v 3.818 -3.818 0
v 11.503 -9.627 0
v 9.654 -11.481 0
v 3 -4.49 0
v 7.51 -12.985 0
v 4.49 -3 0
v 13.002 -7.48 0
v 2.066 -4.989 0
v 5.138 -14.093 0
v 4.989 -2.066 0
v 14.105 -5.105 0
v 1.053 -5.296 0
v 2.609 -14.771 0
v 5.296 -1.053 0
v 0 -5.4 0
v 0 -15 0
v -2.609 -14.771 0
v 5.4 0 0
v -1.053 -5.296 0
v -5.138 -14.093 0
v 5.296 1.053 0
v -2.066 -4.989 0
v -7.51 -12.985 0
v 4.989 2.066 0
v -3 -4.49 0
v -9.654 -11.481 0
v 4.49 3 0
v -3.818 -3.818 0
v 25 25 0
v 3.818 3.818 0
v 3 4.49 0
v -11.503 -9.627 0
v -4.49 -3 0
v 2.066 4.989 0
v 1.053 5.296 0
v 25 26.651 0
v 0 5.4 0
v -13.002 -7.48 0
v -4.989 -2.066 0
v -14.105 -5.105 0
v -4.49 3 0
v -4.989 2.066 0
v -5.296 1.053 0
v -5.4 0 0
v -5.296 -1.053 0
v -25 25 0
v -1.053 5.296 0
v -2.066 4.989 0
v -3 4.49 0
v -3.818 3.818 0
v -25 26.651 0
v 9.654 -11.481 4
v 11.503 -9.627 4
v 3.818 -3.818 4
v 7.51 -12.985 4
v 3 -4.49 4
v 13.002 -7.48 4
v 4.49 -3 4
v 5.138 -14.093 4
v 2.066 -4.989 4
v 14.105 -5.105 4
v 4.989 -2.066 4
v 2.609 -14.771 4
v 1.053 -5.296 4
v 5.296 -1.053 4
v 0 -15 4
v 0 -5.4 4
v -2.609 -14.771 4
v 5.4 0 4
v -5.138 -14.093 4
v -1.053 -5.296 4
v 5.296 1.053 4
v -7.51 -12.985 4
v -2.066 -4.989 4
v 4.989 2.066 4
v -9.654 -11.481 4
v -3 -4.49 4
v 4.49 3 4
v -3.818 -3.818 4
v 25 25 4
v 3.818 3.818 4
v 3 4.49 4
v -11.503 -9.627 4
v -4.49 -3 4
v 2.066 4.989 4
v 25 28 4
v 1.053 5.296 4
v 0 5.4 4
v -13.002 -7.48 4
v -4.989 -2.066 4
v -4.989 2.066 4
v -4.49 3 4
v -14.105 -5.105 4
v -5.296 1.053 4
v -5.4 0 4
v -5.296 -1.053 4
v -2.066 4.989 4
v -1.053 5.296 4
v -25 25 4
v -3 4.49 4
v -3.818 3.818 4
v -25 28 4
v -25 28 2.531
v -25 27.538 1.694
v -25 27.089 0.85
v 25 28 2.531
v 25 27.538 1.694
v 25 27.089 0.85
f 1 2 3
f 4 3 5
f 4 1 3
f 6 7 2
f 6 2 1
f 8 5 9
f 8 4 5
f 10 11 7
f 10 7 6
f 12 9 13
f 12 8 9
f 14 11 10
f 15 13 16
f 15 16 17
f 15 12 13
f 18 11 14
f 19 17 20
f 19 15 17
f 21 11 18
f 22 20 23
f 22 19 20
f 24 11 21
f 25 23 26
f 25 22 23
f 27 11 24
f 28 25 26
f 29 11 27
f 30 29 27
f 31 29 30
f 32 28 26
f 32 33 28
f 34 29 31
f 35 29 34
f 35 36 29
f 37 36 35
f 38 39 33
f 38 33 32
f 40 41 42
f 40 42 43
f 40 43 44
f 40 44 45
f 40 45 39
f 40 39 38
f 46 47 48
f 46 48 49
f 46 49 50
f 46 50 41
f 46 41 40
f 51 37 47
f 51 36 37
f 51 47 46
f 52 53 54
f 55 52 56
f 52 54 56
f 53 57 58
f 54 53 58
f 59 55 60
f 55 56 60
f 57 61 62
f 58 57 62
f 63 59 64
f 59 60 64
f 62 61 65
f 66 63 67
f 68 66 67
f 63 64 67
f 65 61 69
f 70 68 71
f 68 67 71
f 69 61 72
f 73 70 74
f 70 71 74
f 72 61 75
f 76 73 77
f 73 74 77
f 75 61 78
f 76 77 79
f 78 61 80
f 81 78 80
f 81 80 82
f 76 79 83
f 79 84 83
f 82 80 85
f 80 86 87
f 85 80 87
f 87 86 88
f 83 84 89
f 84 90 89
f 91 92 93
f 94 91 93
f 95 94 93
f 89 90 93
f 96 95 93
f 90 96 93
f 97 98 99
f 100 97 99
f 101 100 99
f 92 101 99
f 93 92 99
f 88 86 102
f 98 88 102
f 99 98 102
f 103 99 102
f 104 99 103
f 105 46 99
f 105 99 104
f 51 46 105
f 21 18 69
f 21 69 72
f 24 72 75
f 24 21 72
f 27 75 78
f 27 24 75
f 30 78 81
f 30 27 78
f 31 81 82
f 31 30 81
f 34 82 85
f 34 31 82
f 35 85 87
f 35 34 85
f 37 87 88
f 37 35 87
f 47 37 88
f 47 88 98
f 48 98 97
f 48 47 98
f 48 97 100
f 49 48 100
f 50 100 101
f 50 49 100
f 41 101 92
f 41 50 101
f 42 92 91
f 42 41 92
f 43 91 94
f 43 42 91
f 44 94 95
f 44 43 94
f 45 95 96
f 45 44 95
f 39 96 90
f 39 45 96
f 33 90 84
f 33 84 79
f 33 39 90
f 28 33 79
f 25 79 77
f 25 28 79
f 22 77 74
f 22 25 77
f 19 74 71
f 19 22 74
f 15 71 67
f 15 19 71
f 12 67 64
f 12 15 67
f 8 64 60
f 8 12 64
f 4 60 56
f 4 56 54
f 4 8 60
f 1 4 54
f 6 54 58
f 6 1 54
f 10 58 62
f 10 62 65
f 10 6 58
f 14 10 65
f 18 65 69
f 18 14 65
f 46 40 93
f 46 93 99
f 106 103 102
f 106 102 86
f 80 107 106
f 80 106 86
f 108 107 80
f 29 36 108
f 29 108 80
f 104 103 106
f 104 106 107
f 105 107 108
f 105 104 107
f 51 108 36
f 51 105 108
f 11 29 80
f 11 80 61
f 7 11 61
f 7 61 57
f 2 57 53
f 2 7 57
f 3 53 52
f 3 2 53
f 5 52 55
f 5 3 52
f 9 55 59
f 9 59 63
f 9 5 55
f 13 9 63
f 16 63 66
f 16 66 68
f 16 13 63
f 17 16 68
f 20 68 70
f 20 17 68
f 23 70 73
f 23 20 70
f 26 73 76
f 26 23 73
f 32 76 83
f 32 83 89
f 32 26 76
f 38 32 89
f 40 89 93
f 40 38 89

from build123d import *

# Parameters (mm, degrees)
SKETCH_1_R                 = 5.4
EXTRUDE_1_DEPTH            = 4
CUT_EXTRUDE_534_DEPTH      = 38.749172176
CUT_EXTRUDE_534_DEPTH_BACK = 38.749172176
SKETCH_514_R               = 66.5


with BuildPart() as part:
    # Эскиз1 → Бобышка-Вытянуть1 (new body)
    with BuildSketch(Plane.XY):
        with BuildLine():
            Line((-25, 28), (25, 28))
            Line((25, 28), (25, 25))
            Line((25, 25), (14.104686356, -5.104686356))
            ThreePointArc((14.104686356, -5.104686356), (0, -15), (-14.104686356, -5.104686356))
            Line((-14.104686356, -5.104686356), (-25, 25))
            Line((-25, 25), (-25, 28))
        make_face()
        Circle(SKETCH_1_R, mode=Mode.SUBTRACT)
    extrude(amount=EXTRUDE_1_DEPTH)

    # Sketch 514 → Cut-Extrude 534 (cut, two sides: drawn at the far end of the back side and taken through both)
    with BuildSketch(Plane(origin=(0, 0, 0), x_dir=(0, 0, -1), z_dir=(1, 0, 0)).offset(-CUT_EXTRUDE_534_DEPTH_BACK)):
        with Locations((30, 86)):
            Circle(SKETCH_514_R)
    extrude(amount=CUT_EXTRUDE_534_DEPTH + CUT_EXTRUDE_534_DEPTH_BACK, mode=Mode.SUBTRACT)


solid = part.part
